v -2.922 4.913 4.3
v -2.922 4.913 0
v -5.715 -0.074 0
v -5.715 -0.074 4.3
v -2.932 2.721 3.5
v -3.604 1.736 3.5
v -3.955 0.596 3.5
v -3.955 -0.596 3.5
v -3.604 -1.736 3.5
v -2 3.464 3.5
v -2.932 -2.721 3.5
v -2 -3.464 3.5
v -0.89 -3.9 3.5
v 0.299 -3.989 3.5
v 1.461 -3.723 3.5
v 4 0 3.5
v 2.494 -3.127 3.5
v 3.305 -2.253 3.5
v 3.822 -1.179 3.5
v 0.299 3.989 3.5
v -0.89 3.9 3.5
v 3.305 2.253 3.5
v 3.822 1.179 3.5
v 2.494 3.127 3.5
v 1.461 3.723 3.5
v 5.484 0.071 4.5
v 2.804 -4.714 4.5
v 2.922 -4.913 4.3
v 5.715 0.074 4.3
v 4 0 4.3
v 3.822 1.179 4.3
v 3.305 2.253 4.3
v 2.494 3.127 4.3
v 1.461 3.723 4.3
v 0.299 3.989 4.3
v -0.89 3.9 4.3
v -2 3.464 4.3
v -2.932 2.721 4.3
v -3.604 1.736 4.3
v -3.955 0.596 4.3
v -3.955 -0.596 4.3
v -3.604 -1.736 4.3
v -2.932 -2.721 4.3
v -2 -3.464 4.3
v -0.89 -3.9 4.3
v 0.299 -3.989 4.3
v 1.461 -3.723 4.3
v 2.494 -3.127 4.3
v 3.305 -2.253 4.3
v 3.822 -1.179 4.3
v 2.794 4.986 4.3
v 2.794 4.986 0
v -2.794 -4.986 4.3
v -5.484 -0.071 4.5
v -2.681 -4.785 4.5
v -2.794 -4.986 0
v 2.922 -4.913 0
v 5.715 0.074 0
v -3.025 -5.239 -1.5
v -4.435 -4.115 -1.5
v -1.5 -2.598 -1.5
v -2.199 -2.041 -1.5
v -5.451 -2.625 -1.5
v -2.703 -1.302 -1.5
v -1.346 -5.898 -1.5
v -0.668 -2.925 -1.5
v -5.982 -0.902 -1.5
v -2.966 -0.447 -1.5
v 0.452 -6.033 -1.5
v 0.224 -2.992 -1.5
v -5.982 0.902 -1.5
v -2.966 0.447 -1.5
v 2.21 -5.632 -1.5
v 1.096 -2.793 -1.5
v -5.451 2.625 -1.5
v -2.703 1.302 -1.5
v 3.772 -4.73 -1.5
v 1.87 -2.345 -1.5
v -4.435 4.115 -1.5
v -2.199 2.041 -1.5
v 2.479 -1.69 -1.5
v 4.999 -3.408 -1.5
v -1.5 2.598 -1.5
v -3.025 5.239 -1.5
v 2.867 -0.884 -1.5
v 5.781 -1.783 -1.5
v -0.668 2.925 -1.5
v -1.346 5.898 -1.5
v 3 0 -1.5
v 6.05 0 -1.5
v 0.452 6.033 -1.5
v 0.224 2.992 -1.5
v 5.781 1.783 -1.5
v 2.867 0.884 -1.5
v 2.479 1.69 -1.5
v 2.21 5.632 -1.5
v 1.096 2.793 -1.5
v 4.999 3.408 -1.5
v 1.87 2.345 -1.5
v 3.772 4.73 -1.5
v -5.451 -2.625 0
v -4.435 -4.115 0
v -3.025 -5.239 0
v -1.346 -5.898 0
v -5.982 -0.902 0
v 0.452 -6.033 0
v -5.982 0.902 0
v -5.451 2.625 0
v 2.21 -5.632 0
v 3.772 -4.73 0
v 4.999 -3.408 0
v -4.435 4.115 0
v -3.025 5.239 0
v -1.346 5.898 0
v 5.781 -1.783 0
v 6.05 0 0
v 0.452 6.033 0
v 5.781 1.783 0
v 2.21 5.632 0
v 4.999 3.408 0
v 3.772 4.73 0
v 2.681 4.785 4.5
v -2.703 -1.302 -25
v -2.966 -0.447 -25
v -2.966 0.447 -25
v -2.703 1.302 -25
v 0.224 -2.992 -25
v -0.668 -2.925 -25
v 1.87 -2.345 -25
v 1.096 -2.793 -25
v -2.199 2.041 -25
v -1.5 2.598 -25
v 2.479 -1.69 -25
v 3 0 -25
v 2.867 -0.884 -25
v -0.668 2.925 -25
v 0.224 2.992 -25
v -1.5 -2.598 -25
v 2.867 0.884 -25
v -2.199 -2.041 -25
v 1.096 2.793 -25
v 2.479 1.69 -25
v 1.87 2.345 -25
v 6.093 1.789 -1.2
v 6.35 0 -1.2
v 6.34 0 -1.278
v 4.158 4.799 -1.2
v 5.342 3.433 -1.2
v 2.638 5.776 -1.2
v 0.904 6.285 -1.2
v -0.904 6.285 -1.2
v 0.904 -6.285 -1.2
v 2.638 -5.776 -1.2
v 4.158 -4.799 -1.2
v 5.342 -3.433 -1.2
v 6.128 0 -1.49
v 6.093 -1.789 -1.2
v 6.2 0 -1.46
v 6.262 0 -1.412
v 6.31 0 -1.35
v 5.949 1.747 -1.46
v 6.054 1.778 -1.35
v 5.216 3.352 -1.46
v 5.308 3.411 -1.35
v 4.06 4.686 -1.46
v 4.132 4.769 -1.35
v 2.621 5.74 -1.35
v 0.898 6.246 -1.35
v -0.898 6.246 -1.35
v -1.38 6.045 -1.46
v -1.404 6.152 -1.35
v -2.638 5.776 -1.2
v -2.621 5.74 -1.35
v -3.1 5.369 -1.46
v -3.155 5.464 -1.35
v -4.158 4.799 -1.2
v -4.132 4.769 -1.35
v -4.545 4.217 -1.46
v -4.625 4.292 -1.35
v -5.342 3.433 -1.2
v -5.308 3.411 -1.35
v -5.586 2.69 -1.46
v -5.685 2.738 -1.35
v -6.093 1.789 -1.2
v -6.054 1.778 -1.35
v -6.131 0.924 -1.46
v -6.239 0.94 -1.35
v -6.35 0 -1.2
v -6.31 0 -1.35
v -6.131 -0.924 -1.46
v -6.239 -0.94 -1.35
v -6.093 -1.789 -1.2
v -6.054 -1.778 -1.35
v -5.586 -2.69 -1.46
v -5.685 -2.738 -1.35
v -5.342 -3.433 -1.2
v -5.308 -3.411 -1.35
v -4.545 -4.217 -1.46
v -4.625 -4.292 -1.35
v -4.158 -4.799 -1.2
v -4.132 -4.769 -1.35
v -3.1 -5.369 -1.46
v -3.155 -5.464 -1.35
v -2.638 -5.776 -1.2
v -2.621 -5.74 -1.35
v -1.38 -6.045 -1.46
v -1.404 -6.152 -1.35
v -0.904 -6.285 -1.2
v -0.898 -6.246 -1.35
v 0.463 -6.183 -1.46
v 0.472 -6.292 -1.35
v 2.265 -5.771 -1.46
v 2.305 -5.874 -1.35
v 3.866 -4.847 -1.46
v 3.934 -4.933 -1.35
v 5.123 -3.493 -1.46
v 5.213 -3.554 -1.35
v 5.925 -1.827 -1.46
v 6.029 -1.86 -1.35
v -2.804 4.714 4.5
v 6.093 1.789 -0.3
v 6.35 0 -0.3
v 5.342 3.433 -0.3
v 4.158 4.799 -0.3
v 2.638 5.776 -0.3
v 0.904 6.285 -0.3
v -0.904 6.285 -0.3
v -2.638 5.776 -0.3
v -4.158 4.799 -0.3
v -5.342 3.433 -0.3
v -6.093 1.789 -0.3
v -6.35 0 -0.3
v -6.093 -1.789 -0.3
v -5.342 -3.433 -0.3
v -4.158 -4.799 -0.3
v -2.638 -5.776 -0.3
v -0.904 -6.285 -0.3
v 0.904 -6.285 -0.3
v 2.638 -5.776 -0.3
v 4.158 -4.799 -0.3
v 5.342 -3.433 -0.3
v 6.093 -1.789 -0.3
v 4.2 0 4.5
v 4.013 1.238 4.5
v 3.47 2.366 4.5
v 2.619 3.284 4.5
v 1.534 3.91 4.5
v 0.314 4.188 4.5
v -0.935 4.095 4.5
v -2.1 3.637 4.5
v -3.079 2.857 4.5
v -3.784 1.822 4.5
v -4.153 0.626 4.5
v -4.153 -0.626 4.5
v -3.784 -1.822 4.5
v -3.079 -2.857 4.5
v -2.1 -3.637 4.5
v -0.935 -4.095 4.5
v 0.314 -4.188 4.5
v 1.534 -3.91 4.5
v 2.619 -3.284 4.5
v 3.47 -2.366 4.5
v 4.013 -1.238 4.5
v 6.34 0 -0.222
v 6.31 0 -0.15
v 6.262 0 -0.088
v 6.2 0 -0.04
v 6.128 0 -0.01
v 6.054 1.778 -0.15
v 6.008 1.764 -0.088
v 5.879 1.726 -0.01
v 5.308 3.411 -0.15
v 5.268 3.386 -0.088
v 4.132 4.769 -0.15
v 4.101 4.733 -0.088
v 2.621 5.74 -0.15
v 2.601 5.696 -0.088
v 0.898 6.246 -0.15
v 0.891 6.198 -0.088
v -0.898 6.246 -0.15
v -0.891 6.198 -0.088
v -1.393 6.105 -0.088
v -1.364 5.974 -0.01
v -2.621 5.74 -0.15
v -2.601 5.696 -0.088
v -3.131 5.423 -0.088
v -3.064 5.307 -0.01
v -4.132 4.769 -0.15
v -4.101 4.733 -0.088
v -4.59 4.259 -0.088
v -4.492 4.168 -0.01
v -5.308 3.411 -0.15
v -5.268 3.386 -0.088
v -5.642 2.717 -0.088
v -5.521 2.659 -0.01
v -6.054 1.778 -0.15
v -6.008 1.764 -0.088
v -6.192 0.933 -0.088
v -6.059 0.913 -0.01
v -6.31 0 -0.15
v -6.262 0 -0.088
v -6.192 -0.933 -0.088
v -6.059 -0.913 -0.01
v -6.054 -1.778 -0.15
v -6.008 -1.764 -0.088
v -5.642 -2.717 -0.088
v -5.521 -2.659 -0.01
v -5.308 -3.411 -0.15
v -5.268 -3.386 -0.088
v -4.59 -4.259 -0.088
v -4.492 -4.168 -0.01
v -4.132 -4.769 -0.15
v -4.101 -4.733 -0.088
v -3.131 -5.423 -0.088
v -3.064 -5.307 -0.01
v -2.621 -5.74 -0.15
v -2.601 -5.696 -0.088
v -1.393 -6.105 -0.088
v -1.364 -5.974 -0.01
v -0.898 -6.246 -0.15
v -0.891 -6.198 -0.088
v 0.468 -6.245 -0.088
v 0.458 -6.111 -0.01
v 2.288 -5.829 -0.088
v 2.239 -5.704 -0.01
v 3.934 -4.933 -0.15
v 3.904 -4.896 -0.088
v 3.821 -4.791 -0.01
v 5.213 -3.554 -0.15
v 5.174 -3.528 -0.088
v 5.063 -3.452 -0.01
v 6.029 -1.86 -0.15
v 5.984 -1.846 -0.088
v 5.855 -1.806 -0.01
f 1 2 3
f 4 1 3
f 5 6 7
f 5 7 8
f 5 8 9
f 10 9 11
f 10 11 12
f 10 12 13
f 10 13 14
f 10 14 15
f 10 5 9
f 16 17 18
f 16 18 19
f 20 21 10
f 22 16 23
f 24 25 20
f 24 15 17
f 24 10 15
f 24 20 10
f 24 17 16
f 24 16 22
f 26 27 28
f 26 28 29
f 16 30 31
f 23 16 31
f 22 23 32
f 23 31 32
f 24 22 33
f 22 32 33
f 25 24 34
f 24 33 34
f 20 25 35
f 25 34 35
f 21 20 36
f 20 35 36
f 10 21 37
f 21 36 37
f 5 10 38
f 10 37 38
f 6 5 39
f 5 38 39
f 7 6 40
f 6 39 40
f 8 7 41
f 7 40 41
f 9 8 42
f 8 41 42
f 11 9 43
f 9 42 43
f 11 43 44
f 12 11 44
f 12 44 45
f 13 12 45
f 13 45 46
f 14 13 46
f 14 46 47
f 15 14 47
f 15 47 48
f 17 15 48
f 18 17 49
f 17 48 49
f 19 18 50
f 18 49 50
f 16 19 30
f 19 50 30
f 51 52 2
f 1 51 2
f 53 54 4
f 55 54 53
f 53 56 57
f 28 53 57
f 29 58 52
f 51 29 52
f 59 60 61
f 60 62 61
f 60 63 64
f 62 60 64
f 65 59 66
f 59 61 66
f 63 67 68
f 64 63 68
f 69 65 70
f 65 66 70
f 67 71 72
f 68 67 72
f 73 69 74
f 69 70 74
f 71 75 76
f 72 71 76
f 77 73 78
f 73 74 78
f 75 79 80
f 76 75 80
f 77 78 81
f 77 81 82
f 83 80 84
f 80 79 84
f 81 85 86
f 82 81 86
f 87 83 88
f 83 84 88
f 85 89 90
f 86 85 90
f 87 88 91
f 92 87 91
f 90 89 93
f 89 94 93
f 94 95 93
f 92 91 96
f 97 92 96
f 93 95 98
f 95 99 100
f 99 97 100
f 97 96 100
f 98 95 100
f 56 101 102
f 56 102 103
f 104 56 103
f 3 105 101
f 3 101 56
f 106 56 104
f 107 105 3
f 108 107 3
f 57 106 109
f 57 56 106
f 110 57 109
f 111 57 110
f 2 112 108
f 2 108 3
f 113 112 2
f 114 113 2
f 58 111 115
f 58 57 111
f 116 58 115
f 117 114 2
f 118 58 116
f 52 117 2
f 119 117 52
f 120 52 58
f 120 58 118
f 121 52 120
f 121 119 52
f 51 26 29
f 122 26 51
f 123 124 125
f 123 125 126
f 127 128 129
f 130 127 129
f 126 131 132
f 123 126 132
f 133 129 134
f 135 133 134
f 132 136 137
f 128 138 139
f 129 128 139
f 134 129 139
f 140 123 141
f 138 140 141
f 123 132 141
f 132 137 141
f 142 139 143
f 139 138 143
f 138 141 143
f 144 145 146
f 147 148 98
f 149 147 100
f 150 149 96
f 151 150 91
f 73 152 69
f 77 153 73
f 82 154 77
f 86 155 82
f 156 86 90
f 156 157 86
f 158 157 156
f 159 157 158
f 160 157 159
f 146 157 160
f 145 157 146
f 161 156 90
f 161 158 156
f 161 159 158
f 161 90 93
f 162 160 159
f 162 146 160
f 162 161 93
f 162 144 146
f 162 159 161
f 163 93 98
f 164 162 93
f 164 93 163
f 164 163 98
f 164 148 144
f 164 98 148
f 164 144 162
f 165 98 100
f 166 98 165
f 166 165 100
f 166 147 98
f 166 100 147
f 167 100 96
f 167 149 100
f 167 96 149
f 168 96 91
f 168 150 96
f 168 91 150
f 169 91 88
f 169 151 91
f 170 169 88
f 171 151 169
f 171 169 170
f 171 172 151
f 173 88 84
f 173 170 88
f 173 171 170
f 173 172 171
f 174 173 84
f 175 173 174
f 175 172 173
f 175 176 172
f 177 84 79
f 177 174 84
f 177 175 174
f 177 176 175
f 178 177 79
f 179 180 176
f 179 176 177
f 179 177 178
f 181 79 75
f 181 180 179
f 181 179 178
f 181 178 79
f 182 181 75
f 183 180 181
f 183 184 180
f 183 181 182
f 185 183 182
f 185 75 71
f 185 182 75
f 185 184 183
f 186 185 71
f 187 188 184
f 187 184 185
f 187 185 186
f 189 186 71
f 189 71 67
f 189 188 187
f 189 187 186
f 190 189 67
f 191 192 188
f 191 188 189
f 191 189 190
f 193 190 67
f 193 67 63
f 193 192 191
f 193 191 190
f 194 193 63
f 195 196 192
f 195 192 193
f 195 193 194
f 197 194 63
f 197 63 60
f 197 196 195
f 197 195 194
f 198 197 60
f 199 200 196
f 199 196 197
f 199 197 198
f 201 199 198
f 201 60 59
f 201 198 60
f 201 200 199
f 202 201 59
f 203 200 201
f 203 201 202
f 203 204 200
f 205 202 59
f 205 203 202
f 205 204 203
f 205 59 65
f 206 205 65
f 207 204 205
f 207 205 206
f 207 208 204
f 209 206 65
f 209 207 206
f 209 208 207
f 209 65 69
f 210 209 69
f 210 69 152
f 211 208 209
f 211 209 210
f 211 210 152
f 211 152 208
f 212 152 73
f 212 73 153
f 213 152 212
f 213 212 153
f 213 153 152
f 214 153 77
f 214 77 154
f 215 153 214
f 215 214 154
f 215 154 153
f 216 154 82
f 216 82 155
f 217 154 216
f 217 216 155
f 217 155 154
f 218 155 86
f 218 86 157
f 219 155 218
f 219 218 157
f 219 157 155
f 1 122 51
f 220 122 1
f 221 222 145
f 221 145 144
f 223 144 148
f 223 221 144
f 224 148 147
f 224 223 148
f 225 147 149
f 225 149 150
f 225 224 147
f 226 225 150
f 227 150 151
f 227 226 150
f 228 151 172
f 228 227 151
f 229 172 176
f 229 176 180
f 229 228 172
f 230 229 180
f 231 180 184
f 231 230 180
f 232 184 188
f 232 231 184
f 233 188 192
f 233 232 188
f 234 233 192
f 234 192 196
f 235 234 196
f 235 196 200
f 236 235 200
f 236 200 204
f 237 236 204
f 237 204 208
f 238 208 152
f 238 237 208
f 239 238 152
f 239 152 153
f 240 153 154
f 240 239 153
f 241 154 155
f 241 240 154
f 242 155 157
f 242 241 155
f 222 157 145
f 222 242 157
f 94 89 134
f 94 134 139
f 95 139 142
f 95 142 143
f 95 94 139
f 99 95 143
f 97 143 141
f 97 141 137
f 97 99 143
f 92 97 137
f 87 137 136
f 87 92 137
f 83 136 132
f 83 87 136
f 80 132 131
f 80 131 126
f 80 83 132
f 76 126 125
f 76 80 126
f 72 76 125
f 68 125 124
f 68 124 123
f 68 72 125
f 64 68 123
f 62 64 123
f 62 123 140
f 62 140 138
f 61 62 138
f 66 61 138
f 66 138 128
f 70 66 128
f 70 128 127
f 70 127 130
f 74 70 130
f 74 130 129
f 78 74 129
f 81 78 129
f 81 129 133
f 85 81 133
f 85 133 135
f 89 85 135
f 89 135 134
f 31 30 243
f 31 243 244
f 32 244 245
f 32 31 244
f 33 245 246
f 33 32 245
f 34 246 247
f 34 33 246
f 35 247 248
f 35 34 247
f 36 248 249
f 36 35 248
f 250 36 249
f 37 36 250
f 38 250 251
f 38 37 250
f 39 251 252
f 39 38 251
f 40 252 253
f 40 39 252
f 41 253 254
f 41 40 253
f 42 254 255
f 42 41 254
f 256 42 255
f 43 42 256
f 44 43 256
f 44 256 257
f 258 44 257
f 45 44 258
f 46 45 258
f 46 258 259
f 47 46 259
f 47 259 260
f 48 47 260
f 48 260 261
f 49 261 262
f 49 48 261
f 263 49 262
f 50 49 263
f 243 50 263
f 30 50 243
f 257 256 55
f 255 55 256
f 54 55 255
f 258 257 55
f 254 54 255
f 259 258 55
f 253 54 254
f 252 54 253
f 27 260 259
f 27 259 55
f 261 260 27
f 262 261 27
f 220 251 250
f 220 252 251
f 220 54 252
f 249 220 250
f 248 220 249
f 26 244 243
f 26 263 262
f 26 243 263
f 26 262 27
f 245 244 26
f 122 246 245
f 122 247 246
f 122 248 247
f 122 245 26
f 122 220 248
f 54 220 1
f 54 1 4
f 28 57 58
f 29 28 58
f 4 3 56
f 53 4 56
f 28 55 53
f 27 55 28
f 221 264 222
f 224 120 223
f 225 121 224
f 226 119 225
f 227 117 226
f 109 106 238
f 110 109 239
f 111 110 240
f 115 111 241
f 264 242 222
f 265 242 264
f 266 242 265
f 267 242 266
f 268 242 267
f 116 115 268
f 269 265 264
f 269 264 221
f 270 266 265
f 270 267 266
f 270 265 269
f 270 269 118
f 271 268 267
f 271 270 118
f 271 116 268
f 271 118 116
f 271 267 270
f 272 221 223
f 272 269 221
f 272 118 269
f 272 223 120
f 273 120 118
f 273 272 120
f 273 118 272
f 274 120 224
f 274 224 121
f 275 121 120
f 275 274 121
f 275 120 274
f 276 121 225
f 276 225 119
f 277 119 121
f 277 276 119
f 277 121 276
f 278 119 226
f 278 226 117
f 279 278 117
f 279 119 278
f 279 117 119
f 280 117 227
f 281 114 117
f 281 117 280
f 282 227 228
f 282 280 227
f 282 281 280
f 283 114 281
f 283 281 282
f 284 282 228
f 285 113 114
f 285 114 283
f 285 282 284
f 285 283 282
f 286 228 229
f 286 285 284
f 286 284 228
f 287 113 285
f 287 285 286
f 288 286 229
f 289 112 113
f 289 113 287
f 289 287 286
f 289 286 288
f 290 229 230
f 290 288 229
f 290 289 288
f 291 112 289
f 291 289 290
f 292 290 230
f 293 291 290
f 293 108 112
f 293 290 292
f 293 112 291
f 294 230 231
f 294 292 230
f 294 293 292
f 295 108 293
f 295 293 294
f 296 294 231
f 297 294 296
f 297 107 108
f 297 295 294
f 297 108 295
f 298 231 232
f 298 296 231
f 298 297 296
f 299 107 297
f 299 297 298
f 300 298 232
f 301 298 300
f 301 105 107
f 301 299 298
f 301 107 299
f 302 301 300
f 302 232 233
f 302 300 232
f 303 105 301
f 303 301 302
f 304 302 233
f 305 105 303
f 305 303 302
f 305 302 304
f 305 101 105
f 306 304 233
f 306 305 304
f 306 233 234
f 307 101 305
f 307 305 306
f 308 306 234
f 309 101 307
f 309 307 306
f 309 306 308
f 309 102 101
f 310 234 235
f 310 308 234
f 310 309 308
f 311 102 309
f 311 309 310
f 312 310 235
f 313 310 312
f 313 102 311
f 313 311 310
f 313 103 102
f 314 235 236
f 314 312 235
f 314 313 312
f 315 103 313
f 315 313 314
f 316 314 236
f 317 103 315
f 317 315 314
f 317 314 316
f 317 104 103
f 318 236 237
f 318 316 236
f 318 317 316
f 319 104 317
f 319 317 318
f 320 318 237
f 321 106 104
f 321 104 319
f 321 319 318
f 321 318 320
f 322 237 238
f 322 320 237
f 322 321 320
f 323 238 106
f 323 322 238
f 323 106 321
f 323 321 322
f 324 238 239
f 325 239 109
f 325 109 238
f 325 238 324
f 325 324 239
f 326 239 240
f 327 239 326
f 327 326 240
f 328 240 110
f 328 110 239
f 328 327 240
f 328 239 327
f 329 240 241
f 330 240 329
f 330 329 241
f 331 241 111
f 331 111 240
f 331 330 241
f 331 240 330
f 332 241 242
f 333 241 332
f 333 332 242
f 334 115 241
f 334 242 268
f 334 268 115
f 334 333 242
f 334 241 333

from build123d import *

# Parameters (mm, degrees)
F0_R     = 3
F1_DEPTH = 4.5
F0_R_2   = 6.35
F2_DEPTH = 1.5
F3_DEPTH = 25
F4_R     = 0.3
F5_R     = 4
F6_DEPTH = 1
F7_SIZE  = 0.2


with BuildPart() as f1:
    # F0 (on Top) → F1 (new body)
    with BuildSketch(Plane.XY):
        Polygon((2.921558, -4.912687), (5.715291, 0.0738), (2.793733, 4.986487), (-2.921558, 4.912687), (-5.715291, -0.0738), (-2.793733, -4.986487), align=None)
        Circle(F0_R, mode=Mode.SUBTRACT)
        Circle(F0_R)
    extrude(amount=F1_DEPTH)

    # F0 (on Top) → F2 (join)
    with BuildSketch(Plane.XY):
        Circle(F0_R_2)
        Polygon((2.793733, 4.986487), (5.715291, 0.0738), (2.921558, -4.912687), (-2.793733, -4.986487), (-5.715291, -0.0738), (-2.921558, 4.912687), align=None, mode=Mode.SUBTRACT)
        Circle(F0_R)
        Polygon((2.921558, -4.912687), (5.715291, 0.0738), (2.793733, 4.986487), (-2.921558, 4.912687), (-5.715291, -0.0738), (-2.793733, -4.986487), align=None)
        Circle(F0_R, mode=Mode.SUBTRACT)
    extrude(amount=-F2_DEPTH)

    # F0 (on Top) → F3 (join)
    with BuildSketch(Plane.XY):
        Circle(F0_R)
    extrude(amount=-F3_DEPTH)

    # F4
    f4_edges = [f1.edges().sort_by_distance(p)[0] for p in [
        (6.35, 0, -0.75),
        (-6.35, 0, 0),
        (-6.35, 0, -1.5),
    ]]
    fillet(f4_edges, radius=F4_R)

    # F5 (on face) → F6 (cut)
    with BuildSketch(Plane.XY.offset(4.5)):
        Circle(F5_R)
    extrude(amount=-F6_DEPTH, mode=Mode.SUBTRACT)

    # F7
    f7_edges = [f1.edges().sort_by_distance(p)[0] for p in [
        (0.063913, -4.949587, 4.5),
        (-4.254512, -2.530144, 4.5),
        (4.318425, -2.419444, 4.5),
        (-4.318425, 2.419444, 4.5),
        (4.254512, 2.530144, 4.5),
        (-0.063913, 4.949587, 4.5),
        (-4, 0, 4.5),
    ]]
    chamfer(f7_edges, length=F7_SIZE)


solid = f1.part
